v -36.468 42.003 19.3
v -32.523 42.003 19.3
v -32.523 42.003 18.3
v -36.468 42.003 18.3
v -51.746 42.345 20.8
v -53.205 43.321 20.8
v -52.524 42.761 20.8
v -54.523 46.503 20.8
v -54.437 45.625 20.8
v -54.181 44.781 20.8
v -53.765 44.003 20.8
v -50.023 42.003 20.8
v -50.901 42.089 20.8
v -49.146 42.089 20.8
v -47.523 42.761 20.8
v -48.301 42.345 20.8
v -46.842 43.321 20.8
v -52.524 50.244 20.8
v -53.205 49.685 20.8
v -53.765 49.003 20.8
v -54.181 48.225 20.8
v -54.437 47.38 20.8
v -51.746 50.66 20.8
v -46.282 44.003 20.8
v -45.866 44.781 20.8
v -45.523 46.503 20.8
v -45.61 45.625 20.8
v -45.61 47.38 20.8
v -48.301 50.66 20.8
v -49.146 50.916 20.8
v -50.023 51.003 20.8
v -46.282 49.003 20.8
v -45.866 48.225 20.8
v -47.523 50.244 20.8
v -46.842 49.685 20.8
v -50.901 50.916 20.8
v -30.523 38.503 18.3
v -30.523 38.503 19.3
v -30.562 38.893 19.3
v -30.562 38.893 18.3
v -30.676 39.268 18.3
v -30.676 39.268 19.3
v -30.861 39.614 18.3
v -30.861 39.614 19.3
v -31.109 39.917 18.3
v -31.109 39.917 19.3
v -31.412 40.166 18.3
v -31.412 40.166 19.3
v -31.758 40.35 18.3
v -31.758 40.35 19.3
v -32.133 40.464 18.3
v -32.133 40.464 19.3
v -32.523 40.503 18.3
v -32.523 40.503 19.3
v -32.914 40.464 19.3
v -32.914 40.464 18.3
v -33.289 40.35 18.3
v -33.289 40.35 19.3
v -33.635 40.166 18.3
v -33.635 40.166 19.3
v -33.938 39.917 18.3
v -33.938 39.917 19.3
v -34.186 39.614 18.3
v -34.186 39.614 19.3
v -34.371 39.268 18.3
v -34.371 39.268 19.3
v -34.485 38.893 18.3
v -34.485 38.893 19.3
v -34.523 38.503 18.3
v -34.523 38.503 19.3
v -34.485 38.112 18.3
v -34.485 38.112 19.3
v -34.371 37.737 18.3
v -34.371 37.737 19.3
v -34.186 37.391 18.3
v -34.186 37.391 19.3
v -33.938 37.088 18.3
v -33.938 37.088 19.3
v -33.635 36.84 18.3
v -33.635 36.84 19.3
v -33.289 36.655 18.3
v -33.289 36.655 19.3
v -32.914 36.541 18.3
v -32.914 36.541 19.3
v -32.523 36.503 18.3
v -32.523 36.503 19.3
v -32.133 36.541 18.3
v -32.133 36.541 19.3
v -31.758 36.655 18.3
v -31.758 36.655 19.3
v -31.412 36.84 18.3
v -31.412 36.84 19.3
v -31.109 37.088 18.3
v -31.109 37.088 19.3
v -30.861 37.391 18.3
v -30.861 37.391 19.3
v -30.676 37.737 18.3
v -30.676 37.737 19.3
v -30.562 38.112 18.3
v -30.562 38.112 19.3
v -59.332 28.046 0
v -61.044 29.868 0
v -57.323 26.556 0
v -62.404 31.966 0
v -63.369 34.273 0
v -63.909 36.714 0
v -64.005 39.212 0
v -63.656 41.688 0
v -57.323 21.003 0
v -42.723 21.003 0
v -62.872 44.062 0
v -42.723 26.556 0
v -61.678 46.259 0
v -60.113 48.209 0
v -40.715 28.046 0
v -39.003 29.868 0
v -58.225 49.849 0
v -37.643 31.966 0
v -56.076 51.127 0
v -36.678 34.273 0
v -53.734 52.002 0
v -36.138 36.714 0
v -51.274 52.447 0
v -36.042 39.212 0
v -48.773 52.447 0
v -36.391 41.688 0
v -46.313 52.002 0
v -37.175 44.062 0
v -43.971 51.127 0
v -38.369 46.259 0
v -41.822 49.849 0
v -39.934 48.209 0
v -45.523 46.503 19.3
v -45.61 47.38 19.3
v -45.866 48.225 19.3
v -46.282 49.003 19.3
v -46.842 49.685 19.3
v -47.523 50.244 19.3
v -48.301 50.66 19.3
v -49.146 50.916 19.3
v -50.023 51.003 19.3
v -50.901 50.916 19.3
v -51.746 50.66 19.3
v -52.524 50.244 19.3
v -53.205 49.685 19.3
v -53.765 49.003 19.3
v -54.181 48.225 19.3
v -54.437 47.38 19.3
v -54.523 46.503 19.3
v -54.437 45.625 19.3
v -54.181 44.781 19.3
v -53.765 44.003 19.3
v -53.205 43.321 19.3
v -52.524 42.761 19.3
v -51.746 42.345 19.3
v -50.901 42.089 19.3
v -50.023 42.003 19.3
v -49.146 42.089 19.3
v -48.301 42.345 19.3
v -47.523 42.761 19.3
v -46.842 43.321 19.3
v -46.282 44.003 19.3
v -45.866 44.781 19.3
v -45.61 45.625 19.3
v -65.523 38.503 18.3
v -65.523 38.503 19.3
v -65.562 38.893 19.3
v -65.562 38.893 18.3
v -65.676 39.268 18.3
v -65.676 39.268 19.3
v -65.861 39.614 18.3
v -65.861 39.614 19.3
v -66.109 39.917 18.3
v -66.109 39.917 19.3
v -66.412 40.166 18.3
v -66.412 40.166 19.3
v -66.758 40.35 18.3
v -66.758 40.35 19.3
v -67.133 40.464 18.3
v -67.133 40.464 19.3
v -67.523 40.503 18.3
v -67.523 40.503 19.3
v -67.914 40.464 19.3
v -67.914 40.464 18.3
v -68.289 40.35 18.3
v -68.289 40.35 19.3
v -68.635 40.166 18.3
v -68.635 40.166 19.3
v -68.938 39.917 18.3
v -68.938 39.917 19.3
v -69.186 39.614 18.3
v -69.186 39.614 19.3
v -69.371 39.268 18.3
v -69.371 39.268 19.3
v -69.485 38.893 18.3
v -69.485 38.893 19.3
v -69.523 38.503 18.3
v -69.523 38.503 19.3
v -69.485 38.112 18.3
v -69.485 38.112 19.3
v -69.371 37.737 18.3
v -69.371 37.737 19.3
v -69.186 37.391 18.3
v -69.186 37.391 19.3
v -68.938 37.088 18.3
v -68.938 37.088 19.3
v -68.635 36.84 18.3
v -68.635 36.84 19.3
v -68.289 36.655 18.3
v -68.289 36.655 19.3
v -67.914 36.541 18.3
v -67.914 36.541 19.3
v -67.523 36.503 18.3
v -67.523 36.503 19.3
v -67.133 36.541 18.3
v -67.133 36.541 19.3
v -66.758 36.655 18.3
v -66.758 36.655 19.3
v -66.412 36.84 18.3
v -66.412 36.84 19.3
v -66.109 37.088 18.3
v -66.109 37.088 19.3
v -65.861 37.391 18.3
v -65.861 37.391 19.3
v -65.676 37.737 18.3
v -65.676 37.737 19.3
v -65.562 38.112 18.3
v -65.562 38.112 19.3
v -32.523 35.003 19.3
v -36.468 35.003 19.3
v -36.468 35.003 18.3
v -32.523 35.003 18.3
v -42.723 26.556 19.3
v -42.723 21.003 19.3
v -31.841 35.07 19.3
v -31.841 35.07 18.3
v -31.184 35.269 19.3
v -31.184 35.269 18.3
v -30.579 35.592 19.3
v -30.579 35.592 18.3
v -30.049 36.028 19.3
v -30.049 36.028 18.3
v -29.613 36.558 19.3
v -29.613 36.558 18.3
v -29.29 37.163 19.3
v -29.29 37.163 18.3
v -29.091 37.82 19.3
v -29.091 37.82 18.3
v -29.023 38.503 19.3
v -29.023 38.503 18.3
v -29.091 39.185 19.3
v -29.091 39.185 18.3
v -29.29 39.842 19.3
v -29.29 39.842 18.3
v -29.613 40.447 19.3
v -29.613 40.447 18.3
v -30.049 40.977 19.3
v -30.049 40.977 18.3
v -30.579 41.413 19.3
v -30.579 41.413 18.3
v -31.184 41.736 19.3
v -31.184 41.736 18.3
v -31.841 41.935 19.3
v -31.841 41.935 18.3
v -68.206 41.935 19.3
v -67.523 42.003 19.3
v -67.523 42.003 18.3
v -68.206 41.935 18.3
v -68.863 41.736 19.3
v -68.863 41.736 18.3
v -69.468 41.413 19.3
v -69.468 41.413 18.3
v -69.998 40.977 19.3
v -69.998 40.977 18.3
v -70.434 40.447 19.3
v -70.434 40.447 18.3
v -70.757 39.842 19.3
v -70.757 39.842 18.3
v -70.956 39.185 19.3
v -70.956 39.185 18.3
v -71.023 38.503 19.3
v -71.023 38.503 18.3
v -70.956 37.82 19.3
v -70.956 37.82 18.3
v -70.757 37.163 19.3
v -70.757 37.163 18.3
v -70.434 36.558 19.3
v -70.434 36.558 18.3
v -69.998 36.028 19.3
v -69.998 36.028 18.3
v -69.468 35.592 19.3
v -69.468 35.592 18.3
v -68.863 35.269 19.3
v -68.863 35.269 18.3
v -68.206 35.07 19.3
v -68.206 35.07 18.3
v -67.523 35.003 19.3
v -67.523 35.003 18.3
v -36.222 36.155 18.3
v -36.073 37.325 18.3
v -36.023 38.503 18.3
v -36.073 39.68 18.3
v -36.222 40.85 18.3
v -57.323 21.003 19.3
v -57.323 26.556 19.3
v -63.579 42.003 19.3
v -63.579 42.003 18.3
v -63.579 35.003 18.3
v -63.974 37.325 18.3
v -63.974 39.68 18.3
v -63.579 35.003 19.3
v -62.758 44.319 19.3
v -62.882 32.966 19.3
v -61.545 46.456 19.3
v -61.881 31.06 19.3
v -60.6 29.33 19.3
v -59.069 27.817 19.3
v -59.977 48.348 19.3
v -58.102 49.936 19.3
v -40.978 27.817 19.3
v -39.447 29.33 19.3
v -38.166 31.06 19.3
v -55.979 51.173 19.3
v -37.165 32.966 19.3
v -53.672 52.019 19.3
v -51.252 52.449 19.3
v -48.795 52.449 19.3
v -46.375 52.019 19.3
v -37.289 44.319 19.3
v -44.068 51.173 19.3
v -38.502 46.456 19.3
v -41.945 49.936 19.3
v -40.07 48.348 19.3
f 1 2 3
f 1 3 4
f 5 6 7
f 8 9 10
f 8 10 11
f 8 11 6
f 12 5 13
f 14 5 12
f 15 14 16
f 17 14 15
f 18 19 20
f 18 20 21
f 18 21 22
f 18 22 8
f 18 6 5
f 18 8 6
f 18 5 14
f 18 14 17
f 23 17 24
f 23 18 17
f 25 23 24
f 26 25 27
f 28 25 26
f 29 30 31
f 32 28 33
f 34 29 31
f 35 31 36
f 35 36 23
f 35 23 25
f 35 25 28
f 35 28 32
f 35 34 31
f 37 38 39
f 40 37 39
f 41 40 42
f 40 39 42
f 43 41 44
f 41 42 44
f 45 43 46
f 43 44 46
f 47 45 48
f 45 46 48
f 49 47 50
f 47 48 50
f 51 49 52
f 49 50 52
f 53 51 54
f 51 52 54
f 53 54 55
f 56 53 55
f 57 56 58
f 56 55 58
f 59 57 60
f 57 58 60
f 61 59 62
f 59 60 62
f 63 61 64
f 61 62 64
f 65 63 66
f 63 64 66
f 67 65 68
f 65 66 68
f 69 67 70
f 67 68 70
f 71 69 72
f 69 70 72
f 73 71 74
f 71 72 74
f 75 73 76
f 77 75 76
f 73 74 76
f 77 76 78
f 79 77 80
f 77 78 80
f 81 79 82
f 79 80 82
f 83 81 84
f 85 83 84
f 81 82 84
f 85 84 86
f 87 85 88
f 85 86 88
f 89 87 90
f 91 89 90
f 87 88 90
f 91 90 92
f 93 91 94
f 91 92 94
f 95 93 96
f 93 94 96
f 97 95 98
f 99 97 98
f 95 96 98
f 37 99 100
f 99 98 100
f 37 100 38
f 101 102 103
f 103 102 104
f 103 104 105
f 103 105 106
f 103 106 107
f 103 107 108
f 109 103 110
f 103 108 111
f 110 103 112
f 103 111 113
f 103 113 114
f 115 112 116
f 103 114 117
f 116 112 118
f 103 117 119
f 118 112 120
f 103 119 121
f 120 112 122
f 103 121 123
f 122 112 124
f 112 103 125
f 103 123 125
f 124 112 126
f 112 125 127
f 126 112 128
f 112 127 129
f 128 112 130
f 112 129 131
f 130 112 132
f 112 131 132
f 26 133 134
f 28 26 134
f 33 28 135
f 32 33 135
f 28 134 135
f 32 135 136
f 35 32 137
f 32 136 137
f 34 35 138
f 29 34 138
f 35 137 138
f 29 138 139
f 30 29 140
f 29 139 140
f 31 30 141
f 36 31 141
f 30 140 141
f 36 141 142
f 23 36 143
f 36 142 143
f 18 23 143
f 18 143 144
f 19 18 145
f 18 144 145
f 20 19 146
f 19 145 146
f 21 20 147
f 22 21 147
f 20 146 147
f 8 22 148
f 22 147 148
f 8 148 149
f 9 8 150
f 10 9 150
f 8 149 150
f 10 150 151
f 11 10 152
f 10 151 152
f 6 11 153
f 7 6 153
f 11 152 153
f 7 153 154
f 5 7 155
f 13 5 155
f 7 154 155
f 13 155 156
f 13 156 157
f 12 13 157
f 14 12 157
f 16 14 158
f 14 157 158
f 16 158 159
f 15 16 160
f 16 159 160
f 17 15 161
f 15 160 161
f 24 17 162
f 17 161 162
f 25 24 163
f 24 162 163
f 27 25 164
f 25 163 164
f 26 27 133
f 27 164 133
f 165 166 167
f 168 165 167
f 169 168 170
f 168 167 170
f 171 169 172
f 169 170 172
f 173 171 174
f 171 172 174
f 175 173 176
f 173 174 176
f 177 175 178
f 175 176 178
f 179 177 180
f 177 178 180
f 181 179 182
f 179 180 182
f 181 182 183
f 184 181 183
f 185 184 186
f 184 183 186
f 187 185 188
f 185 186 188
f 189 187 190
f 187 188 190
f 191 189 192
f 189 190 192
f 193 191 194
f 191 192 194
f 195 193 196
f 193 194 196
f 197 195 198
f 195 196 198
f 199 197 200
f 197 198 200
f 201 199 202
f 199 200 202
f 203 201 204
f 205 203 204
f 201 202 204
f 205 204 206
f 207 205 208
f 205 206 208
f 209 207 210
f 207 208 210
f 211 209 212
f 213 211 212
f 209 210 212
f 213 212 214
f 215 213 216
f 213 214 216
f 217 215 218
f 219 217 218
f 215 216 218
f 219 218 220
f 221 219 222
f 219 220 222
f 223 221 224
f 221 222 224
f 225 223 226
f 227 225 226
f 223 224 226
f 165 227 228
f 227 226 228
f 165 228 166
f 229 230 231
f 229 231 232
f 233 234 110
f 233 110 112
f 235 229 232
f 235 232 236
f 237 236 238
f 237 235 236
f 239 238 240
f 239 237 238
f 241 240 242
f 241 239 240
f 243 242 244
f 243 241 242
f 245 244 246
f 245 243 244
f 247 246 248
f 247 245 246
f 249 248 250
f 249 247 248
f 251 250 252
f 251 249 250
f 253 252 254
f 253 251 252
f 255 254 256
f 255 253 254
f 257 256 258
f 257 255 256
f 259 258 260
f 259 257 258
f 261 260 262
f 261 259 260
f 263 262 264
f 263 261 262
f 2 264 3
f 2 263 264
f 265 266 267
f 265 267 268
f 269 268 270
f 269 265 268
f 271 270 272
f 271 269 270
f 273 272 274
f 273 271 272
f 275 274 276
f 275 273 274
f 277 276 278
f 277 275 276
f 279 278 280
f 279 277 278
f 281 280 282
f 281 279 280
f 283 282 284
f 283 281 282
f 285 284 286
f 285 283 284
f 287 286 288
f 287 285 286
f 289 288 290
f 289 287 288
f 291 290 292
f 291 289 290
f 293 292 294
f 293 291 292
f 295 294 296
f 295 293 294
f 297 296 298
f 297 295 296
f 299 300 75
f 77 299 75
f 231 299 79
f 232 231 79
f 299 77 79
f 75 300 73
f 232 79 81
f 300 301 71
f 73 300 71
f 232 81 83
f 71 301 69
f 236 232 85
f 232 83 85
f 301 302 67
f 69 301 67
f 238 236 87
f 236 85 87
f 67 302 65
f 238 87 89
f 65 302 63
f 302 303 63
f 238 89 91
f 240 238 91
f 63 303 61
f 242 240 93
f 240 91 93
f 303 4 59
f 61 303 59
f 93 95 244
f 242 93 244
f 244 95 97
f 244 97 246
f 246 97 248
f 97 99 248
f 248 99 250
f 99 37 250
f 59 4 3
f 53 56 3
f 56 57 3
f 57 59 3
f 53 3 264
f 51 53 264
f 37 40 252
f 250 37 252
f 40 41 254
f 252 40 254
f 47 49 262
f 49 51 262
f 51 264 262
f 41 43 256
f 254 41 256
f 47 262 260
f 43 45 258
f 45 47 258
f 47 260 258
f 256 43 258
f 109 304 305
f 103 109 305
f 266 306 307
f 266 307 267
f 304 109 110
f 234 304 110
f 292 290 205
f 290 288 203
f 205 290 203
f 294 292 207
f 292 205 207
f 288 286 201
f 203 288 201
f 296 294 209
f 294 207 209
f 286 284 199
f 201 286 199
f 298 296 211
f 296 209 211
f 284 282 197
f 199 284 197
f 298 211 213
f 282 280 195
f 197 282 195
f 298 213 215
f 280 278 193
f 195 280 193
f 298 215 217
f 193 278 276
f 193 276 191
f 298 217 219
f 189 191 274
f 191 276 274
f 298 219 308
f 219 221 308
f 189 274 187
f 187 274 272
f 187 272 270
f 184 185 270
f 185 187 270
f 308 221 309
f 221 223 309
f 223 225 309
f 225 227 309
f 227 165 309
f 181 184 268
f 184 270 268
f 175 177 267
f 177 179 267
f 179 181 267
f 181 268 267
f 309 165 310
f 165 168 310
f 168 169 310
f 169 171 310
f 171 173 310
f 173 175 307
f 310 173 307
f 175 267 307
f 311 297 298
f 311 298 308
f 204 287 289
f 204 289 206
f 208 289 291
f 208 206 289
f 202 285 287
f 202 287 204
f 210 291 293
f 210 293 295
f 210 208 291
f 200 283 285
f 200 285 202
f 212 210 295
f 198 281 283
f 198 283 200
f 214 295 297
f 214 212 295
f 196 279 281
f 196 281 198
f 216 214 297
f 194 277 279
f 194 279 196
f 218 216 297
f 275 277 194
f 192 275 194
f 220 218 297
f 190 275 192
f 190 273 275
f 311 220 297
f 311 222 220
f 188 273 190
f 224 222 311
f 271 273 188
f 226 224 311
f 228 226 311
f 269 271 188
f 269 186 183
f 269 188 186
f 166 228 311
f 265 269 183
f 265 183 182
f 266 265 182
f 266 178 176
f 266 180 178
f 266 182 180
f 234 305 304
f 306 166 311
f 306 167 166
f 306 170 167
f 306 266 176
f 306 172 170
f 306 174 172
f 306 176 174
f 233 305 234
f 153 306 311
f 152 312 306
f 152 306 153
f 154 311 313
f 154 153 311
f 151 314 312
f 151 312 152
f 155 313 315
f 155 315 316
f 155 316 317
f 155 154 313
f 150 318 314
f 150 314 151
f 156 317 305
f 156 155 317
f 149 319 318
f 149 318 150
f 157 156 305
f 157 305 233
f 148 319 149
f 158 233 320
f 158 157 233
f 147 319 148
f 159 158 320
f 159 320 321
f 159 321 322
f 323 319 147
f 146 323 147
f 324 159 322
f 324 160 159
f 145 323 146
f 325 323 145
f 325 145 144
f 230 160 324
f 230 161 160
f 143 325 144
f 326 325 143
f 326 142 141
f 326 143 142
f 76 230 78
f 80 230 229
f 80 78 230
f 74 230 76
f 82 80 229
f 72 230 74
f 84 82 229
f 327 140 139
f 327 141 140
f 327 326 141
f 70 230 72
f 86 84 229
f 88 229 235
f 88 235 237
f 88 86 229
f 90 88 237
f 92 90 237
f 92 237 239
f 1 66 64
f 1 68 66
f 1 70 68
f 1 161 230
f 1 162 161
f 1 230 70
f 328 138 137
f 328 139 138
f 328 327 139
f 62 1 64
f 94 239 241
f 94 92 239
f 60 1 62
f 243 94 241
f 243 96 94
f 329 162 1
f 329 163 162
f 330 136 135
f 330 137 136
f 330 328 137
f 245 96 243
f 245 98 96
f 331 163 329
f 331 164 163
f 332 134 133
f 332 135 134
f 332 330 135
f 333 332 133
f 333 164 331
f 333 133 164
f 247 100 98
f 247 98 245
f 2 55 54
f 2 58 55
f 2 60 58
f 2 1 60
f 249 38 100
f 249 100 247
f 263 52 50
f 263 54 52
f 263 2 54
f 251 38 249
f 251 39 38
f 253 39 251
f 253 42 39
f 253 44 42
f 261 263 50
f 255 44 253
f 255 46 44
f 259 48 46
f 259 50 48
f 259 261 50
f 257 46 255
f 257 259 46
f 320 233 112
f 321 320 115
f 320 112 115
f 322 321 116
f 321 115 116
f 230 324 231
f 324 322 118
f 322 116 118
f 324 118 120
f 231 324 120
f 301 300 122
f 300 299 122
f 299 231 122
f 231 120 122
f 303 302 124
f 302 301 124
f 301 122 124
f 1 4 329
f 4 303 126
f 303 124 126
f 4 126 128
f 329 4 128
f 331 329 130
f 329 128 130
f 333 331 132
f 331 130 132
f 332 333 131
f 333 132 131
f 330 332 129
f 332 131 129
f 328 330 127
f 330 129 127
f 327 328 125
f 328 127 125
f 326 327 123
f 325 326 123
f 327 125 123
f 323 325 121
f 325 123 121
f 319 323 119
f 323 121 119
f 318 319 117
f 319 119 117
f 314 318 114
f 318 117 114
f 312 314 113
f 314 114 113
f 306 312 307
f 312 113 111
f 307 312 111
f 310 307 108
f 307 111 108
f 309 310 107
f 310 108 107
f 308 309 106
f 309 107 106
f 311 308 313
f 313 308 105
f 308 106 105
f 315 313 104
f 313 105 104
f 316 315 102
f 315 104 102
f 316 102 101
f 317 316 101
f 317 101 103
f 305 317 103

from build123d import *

# Parameters (mm, degrees)
SKETCH_1_R      = 14
EXTRUDE_1_DEPTH = 19.3
SKETCH_3_R      = 2
EXTRUDE_2_DEPTH = 1
SKETCH_4_R      = 4.5
EXTRUDE_3_DEPTH = 1.5
SKETCH_6_W      = 14.6
SKETCH_6_H      = 5.55387092
EXTRUDE_4_DEPTH = 19.3


with BuildPart() as part:
    # 草图1 → 凸台-拉伸1 (new body)
    with BuildSketch(Plane.XY):
        with Locations((-50.023496645, 38.50258845)):
            Circle(SKETCH_1_R)
    extrude(amount=EXTRUDE_1_DEPTH)

    # 草图3 → 凸台-拉伸2 (add)
    with BuildSketch(Plane.XY.offset(19.3)):
        with BuildLine():
            Line((-63.578938357, 42.00258845), (-67.523496645, 42.00258845))
            ThreePointArc((-67.523496645, 42.00258845), (-71.023496645, 38.50258845), (-67.523496645, 35.00258845))
            Line((-67.523496645, 35.00258845), (-63.578938357, 35.00258845))
            ThreePointArc((-63.578938357, 35.00258845), (-64.023496645, 38.50258845), (-63.578938357, 42.00258845))
        make_face()
        with Locations((-67.523496645, 38.50258845)):
            Circle(SKETCH_3_R, mode=Mode.SUBTRACT)
        with BuildLine():
            Line((-32.523496645, 42.00258845), (-36.468054934, 42.00258845))
            ThreePointArc((-36.468054934, 42.00258845), (-36.135080898, 40.266648545), (-36.023496645, 38.50258845))
            ThreePointArc((-36.023496645, 38.50258845), (-36.135080898, 36.738528355), (-36.468054934, 35.00258845))
            Line((-36.468054934, 35.00258845), (-32.523496645, 35.00258845))
            ThreePointArc((-32.523496645, 35.00258845), (-29.023496645, 38.50258845), (-32.523496645, 42.00258845))
        make_face()
        with Locations((-32.523496645, 38.50258845)):
            Circle(SKETCH_3_R, mode=Mode.SUBTRACT)
        with BuildLine():
            ThreePointArc((-42.723496645, 26.55645937), (-50.023496645, 24.50258845), (-57.323496645, 26.55645937))
            Line((-57.323496645, 26.55645937), (-57.323496645, 21.00258845))
            Line((-57.323496645, 21.00258845), (-42.723496645, 21.00258845))
            Line((-42.723496645, 21.00258845), (-42.723496645, 26.55645937))
        make_face()
    extrude(amount=-EXTRUDE_2_DEPTH)

    # 草图4 → 凸台-拉伸3 (add)
    with BuildSketch(Plane.XY.offset(19.3)):
        with Locations((-50.023496645, 46.50258845)):
            Circle(SKETCH_4_R)
    extrude(amount=EXTRUDE_3_DEPTH)

    # 草图6 → 凸台-拉伸4 (add)
    with BuildSketch(Plane.XY.offset(19.3)):
        with Locations((-50.023496645, 23.77952391)):
            Rectangle(SKETCH_6_W, SKETCH_6_H)
    extrude(amount=-EXTRUDE_4_DEPTH)


solid = part.part
